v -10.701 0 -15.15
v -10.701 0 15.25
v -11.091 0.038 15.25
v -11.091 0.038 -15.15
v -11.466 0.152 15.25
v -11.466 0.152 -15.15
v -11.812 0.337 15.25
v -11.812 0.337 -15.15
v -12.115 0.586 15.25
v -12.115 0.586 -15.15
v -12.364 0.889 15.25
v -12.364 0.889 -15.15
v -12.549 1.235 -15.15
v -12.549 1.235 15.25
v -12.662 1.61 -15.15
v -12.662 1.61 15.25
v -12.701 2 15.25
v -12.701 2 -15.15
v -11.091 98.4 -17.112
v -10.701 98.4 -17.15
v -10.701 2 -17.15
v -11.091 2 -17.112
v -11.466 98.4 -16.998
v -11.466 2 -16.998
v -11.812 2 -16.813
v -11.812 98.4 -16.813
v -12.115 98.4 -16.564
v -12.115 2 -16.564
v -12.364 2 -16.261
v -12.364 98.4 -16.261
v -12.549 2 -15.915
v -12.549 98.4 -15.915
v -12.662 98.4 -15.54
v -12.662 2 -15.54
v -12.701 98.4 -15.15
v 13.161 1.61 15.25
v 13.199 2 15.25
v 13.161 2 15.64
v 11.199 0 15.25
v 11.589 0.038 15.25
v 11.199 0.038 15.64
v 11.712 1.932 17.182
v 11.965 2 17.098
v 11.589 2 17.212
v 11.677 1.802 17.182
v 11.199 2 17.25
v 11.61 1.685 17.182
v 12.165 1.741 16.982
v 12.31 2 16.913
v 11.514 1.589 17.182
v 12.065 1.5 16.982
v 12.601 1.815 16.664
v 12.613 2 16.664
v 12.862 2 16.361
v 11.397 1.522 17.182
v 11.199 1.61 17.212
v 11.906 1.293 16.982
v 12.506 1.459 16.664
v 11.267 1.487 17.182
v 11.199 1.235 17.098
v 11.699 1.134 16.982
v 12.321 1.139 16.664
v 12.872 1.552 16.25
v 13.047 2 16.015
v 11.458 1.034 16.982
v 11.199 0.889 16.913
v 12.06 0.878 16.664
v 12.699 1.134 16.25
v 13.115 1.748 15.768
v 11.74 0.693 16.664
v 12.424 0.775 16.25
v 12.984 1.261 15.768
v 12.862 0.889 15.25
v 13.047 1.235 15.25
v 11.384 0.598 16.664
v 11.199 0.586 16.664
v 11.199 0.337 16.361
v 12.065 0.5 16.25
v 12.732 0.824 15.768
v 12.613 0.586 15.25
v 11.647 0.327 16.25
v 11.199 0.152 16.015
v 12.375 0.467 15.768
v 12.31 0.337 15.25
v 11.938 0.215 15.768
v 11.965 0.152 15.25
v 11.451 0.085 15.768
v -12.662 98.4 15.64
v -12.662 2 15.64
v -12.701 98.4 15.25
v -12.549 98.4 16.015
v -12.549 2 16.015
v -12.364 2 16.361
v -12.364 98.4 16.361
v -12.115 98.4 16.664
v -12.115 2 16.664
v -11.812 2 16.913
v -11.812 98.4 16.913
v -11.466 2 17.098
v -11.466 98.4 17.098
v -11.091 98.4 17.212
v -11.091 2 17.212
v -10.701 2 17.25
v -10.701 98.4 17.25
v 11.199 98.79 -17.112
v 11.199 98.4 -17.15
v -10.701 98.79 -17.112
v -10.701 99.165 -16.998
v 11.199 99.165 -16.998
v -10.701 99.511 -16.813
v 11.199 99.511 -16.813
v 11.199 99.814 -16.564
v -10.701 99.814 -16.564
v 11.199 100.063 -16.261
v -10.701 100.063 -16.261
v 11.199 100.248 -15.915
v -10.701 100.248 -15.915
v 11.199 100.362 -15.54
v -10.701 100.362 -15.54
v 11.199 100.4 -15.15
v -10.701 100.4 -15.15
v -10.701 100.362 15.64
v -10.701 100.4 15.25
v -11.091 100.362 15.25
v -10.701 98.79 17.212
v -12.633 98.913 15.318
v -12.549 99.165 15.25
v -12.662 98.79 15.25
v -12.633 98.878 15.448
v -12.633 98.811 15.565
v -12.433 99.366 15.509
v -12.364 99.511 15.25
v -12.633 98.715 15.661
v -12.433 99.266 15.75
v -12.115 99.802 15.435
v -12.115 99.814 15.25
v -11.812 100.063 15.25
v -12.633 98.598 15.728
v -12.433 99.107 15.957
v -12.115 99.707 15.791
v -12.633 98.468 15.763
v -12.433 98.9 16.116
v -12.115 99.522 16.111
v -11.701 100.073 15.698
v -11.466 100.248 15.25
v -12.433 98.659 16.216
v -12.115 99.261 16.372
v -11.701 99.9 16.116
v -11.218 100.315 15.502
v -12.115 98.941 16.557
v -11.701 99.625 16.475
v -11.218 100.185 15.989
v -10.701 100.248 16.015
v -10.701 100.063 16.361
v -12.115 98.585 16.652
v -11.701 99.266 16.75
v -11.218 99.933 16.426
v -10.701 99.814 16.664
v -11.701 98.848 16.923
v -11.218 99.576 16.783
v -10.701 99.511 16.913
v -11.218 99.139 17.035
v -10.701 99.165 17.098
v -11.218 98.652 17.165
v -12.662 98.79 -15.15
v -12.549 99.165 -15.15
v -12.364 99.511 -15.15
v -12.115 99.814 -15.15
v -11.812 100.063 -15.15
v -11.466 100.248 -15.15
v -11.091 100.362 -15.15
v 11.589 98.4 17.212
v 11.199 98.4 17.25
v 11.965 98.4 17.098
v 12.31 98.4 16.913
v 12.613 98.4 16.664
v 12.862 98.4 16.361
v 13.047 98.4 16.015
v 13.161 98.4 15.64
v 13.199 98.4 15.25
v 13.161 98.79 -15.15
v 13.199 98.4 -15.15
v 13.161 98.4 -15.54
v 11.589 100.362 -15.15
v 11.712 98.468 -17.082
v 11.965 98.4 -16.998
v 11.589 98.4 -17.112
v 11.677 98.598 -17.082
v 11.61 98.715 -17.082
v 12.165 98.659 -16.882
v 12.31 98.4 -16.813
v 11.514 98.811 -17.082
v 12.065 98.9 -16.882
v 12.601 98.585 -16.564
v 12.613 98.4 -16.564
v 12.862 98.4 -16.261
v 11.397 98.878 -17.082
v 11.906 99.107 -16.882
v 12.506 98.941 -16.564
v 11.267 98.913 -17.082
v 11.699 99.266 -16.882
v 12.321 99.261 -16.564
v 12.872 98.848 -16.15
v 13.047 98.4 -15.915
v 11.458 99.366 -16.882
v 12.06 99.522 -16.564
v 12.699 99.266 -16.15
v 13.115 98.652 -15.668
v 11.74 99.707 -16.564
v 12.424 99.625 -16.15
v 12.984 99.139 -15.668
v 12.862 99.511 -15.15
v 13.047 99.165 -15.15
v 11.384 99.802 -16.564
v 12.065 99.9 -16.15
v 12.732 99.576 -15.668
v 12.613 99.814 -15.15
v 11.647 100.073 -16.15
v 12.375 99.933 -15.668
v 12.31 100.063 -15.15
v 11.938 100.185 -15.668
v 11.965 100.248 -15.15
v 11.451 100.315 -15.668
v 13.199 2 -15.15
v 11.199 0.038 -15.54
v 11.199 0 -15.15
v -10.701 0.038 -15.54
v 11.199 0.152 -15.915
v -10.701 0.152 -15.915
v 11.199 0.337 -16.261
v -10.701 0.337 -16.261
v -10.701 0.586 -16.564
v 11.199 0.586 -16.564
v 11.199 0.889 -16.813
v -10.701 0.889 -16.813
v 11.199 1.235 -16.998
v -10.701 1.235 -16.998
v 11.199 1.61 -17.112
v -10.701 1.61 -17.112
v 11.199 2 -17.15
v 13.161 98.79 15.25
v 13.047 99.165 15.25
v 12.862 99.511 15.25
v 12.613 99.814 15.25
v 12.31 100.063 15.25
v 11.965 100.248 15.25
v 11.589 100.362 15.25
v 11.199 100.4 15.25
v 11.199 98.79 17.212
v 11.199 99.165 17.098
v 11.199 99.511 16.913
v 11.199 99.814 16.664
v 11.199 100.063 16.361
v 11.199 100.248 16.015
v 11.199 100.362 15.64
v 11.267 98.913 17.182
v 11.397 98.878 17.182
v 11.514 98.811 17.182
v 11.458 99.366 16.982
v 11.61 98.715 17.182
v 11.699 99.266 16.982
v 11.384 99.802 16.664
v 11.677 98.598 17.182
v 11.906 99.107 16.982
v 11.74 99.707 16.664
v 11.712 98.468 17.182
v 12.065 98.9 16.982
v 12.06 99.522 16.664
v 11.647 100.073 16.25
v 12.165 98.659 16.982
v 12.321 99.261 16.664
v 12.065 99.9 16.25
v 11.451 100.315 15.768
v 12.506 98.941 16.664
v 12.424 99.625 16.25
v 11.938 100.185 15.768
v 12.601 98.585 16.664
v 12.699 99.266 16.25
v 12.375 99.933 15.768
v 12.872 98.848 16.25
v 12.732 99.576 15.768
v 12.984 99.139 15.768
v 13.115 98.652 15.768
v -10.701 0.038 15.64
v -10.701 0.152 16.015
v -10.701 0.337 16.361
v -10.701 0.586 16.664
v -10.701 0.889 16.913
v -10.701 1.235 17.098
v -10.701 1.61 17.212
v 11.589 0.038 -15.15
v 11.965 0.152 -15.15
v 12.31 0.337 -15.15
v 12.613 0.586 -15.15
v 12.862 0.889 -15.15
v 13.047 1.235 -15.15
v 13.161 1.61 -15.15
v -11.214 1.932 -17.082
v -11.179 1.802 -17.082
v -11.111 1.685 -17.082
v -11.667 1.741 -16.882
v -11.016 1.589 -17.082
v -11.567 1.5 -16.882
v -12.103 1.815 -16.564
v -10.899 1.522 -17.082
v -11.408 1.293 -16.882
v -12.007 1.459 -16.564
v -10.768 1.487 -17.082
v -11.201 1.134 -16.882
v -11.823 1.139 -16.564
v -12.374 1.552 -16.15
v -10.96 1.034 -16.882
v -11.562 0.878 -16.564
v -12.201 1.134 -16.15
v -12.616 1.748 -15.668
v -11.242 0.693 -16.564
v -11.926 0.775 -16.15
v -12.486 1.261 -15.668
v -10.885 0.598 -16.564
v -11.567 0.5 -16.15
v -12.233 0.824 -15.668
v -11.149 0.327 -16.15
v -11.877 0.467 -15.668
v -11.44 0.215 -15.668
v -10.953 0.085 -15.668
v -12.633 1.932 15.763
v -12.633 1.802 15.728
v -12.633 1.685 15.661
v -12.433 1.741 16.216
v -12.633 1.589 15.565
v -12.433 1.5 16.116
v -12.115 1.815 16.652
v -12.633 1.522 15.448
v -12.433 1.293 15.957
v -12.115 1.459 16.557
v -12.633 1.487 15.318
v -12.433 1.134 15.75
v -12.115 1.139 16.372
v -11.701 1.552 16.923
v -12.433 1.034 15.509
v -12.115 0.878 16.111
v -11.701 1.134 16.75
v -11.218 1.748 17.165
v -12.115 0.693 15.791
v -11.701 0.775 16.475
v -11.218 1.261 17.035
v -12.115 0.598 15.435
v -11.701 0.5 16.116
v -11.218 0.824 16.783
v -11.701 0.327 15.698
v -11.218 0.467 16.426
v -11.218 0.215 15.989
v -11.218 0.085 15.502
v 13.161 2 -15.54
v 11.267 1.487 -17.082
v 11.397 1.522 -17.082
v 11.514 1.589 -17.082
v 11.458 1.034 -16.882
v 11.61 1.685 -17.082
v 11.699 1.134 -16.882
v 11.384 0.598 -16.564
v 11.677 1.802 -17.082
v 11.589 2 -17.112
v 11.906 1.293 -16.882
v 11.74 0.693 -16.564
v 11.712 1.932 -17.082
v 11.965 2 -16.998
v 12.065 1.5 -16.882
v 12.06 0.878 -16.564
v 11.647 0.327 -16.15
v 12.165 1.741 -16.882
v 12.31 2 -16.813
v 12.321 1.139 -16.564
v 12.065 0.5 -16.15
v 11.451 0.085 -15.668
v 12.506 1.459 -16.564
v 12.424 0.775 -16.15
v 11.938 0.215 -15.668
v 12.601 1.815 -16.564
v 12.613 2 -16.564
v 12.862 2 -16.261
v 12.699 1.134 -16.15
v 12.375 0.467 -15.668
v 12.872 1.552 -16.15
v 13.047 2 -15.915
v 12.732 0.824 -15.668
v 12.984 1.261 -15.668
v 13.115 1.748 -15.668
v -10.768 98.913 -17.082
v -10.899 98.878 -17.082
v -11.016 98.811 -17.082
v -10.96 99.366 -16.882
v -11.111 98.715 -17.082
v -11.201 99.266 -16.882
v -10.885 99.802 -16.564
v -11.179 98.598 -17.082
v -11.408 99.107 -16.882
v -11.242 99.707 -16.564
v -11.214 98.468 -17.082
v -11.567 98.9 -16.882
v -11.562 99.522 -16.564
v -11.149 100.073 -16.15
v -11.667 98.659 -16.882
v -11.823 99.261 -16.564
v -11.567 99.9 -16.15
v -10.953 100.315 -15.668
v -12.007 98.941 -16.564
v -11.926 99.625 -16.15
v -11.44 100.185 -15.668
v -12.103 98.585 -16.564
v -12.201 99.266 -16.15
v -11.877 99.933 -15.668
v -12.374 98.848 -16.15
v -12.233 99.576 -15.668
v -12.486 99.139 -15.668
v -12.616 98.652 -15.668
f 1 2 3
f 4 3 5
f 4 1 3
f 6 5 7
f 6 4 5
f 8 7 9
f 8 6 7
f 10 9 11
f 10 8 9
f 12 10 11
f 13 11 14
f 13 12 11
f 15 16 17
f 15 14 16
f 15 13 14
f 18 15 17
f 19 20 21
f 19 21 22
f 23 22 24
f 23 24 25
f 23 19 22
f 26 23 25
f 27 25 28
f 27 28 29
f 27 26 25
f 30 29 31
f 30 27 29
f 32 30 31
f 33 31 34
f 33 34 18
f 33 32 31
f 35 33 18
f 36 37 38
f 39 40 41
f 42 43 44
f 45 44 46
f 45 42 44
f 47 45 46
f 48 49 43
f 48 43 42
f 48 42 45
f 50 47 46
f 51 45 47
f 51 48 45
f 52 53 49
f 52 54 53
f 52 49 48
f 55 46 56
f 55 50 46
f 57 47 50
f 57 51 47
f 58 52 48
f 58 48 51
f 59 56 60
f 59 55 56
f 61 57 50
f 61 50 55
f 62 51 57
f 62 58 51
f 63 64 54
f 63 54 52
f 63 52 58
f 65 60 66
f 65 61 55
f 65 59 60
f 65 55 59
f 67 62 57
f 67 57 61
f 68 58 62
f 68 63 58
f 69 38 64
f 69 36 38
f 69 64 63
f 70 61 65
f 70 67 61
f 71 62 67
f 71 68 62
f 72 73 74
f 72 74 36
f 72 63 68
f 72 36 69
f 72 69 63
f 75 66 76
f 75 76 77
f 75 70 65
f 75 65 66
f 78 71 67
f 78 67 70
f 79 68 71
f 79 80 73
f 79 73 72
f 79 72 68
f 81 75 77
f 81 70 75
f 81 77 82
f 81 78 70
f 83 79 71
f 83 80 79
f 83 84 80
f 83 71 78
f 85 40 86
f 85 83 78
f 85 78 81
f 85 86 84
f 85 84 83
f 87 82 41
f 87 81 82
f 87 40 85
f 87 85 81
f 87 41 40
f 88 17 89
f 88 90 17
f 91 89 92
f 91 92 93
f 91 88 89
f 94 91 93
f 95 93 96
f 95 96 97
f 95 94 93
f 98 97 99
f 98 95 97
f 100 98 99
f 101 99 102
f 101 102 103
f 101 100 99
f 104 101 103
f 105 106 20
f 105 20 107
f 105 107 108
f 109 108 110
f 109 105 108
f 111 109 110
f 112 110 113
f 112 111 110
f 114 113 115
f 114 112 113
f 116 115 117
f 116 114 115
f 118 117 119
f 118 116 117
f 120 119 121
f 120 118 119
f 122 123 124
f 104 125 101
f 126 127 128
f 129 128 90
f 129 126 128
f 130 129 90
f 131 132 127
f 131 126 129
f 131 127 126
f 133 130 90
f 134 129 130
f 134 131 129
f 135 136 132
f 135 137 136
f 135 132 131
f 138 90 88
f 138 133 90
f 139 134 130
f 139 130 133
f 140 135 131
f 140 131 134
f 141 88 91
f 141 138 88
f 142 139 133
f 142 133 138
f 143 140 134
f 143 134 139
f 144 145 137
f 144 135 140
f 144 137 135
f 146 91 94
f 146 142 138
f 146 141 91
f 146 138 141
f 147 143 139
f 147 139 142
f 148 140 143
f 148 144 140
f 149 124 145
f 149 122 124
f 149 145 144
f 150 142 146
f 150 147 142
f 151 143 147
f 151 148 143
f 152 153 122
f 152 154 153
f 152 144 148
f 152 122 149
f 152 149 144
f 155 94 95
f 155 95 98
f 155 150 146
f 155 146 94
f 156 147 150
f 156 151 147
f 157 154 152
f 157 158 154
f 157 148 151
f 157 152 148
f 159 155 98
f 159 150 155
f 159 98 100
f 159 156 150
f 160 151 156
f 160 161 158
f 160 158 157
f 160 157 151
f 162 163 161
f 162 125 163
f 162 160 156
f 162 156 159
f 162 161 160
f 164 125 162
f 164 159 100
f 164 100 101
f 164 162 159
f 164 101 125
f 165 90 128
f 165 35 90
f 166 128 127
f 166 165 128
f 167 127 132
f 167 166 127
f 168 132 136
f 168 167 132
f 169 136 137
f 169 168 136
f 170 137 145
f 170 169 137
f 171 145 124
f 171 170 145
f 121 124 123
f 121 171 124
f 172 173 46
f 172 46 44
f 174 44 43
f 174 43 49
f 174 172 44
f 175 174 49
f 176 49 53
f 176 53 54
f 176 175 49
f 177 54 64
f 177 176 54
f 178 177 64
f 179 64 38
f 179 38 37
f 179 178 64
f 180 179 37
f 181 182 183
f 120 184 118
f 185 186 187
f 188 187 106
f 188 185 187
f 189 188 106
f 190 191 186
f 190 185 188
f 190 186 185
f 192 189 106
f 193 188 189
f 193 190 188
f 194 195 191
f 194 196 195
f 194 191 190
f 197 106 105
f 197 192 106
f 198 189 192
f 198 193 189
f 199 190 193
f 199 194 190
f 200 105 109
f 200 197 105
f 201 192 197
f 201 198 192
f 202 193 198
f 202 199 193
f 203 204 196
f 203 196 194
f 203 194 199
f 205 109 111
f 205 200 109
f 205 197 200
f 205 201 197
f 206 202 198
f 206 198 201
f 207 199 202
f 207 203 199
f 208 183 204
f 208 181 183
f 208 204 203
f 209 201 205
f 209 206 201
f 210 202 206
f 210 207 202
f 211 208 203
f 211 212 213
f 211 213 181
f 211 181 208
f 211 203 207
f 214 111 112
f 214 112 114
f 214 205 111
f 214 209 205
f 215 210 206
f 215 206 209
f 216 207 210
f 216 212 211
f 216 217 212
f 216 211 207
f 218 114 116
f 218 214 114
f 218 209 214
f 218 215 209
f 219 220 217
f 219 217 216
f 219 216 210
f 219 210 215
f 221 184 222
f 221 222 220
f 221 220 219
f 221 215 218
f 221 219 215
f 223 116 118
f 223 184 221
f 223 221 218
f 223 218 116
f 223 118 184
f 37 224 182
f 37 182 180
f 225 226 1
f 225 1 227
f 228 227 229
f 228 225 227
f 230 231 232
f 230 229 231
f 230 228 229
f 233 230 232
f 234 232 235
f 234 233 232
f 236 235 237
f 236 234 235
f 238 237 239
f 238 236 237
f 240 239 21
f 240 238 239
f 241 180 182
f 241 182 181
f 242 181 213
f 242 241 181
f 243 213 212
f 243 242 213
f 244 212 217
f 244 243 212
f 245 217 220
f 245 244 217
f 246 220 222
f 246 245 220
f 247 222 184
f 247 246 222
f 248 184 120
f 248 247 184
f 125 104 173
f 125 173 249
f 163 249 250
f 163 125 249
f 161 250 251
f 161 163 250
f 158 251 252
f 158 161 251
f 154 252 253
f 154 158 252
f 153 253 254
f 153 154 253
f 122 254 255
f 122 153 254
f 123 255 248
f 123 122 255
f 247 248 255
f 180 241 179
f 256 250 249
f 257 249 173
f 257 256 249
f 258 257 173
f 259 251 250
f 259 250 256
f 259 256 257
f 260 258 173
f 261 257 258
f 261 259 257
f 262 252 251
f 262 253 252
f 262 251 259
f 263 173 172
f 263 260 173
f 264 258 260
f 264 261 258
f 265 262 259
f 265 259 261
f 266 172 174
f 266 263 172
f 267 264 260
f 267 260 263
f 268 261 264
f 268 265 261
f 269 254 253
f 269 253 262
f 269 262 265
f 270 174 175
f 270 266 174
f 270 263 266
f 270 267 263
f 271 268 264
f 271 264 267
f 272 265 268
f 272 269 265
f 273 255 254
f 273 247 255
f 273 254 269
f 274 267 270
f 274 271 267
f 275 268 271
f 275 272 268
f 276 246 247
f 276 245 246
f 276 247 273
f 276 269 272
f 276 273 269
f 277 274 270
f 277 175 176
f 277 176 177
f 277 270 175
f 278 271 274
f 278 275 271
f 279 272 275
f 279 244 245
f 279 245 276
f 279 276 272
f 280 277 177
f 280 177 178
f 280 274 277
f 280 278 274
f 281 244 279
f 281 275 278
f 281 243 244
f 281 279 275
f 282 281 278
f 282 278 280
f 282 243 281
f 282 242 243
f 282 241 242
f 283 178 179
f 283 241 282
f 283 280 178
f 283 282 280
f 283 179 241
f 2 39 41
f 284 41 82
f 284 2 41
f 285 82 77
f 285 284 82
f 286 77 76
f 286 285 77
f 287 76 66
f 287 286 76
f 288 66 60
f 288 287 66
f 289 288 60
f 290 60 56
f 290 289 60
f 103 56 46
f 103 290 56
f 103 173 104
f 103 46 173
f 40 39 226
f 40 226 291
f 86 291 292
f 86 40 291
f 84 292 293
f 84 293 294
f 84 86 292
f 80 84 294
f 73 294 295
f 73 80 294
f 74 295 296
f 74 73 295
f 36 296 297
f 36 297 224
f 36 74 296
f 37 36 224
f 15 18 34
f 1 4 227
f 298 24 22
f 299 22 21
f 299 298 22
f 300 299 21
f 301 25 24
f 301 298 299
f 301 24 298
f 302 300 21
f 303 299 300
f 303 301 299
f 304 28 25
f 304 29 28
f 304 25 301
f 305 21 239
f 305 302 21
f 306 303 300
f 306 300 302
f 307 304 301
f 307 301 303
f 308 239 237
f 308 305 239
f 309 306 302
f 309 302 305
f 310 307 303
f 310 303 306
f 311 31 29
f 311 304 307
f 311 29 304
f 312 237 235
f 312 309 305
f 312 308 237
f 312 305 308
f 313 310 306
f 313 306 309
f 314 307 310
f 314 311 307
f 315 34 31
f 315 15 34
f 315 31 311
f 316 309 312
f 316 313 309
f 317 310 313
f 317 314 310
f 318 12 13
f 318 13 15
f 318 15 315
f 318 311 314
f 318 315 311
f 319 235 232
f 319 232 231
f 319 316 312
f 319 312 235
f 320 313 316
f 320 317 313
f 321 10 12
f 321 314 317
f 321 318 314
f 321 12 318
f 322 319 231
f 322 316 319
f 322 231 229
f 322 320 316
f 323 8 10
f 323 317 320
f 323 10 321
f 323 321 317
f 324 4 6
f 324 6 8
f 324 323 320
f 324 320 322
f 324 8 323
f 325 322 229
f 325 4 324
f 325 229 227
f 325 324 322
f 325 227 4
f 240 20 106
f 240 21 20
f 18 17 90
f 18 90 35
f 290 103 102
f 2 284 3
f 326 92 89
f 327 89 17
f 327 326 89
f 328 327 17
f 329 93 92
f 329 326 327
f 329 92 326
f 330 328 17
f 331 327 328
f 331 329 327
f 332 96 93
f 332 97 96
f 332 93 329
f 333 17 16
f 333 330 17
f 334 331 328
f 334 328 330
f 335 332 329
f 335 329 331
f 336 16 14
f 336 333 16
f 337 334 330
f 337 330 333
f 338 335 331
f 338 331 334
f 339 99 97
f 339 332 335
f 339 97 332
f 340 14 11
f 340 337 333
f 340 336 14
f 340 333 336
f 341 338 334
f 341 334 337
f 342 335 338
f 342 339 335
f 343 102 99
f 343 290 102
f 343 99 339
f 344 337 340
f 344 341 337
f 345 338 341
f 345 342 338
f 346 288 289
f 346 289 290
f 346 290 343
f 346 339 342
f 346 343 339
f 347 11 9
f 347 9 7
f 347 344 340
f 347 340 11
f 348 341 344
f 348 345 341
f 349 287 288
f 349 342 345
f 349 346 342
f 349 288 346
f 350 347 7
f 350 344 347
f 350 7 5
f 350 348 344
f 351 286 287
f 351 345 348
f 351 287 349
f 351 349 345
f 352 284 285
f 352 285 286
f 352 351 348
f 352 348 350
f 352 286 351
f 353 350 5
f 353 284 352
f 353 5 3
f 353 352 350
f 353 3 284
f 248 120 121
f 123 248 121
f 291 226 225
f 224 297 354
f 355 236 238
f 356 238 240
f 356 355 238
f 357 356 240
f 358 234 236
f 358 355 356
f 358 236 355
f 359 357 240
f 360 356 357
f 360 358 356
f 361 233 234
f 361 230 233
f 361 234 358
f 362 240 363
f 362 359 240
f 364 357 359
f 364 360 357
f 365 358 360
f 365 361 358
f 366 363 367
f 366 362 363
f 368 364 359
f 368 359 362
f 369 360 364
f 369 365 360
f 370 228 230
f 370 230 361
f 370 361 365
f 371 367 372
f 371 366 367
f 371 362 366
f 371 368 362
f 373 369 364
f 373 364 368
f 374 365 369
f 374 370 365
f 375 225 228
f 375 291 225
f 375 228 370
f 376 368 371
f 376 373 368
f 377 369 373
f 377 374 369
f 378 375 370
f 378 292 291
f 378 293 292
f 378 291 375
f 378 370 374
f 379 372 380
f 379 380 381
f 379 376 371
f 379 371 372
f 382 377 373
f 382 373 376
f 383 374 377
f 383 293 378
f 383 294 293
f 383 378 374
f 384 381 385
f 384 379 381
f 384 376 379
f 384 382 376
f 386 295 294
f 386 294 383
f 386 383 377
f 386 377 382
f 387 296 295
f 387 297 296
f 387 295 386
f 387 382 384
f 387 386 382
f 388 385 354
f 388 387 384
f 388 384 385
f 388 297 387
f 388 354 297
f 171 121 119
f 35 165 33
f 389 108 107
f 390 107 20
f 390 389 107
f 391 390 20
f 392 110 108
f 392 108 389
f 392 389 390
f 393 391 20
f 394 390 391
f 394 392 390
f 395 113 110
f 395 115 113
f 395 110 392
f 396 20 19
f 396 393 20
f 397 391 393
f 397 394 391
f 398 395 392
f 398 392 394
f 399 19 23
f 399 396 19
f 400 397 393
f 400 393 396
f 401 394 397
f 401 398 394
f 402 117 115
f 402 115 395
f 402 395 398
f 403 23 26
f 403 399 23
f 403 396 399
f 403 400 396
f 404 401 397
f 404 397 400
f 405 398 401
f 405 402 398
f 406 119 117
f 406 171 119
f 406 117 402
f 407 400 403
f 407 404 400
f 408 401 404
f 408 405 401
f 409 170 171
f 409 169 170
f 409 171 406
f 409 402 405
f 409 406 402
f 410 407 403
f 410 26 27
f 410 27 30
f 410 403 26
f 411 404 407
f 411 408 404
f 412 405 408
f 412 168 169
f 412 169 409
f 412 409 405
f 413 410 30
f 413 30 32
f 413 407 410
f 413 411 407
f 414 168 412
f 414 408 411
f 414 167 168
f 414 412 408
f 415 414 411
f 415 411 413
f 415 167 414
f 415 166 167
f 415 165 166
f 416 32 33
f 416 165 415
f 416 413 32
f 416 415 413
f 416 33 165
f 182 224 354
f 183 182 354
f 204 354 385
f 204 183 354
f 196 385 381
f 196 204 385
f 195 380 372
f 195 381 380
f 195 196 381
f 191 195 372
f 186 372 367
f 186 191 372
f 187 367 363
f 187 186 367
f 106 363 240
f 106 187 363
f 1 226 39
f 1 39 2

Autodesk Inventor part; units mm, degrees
ref_plane "YZ Plane" through (0, 0, 0) normal (1, 0, 0) x (0, 1, 0)
ref_plane "XZ Plane" through (0, 0, 0) normal (0, 1, 0) x (-1, 0, 0)
ref_plane "XY Plane" through (0, 0, 0) normal (0, 0, 1) x (1, 0, 0)
sketch "Sketch1" plane through (0, 0, 0) normal (0, 1, 0) x (-1, 0, 0)
  line L0 (-13.1992, 17.25) -> (12.7008, 17.25)
  line L1 (12.7008, 17.25) -> (12.7008, -17.15)
  line L2 (12.7008, -17.15) -> (-13.1992, -17.15)
  line L3 (-13.1992, -17.15) -> (-13.1992, 17.25)
  line L4 (-13.1992, 17.25) -> (12.7008, -17.15) construction
  line L5 (12.7008, 17.25) -> (-13.1992, -17.15) construction
  point P0 (0, 0)
  point P1 (-0.2492, 0.05)
  dimension "d0" = 25.9
  dimension "d1" = 34.4
extrude "Extrusion1" add sketch "Sketch1" along normal blind 100.4
fillet "Fillet1" radius 2 12 edges at (13.1992, 100.4, 0.05) (0.2492, 100.4, 17.25) (-12.7008, 100.4, 0.05) (0.2492, 100.4, -17.15) (13.1992, 0, 0.05) (0.2492, 0, 17.25) (-12.7008, 0, 0.05) (0.2492, 0, -17.15) (13.1992, 50.2, -17.15) (-12.7008, 50.2, -17.15) (13.1992, 50.2, 17.25) (-12.7008, 50.2, 17.25)
properties part number "DikkeBatterij"
